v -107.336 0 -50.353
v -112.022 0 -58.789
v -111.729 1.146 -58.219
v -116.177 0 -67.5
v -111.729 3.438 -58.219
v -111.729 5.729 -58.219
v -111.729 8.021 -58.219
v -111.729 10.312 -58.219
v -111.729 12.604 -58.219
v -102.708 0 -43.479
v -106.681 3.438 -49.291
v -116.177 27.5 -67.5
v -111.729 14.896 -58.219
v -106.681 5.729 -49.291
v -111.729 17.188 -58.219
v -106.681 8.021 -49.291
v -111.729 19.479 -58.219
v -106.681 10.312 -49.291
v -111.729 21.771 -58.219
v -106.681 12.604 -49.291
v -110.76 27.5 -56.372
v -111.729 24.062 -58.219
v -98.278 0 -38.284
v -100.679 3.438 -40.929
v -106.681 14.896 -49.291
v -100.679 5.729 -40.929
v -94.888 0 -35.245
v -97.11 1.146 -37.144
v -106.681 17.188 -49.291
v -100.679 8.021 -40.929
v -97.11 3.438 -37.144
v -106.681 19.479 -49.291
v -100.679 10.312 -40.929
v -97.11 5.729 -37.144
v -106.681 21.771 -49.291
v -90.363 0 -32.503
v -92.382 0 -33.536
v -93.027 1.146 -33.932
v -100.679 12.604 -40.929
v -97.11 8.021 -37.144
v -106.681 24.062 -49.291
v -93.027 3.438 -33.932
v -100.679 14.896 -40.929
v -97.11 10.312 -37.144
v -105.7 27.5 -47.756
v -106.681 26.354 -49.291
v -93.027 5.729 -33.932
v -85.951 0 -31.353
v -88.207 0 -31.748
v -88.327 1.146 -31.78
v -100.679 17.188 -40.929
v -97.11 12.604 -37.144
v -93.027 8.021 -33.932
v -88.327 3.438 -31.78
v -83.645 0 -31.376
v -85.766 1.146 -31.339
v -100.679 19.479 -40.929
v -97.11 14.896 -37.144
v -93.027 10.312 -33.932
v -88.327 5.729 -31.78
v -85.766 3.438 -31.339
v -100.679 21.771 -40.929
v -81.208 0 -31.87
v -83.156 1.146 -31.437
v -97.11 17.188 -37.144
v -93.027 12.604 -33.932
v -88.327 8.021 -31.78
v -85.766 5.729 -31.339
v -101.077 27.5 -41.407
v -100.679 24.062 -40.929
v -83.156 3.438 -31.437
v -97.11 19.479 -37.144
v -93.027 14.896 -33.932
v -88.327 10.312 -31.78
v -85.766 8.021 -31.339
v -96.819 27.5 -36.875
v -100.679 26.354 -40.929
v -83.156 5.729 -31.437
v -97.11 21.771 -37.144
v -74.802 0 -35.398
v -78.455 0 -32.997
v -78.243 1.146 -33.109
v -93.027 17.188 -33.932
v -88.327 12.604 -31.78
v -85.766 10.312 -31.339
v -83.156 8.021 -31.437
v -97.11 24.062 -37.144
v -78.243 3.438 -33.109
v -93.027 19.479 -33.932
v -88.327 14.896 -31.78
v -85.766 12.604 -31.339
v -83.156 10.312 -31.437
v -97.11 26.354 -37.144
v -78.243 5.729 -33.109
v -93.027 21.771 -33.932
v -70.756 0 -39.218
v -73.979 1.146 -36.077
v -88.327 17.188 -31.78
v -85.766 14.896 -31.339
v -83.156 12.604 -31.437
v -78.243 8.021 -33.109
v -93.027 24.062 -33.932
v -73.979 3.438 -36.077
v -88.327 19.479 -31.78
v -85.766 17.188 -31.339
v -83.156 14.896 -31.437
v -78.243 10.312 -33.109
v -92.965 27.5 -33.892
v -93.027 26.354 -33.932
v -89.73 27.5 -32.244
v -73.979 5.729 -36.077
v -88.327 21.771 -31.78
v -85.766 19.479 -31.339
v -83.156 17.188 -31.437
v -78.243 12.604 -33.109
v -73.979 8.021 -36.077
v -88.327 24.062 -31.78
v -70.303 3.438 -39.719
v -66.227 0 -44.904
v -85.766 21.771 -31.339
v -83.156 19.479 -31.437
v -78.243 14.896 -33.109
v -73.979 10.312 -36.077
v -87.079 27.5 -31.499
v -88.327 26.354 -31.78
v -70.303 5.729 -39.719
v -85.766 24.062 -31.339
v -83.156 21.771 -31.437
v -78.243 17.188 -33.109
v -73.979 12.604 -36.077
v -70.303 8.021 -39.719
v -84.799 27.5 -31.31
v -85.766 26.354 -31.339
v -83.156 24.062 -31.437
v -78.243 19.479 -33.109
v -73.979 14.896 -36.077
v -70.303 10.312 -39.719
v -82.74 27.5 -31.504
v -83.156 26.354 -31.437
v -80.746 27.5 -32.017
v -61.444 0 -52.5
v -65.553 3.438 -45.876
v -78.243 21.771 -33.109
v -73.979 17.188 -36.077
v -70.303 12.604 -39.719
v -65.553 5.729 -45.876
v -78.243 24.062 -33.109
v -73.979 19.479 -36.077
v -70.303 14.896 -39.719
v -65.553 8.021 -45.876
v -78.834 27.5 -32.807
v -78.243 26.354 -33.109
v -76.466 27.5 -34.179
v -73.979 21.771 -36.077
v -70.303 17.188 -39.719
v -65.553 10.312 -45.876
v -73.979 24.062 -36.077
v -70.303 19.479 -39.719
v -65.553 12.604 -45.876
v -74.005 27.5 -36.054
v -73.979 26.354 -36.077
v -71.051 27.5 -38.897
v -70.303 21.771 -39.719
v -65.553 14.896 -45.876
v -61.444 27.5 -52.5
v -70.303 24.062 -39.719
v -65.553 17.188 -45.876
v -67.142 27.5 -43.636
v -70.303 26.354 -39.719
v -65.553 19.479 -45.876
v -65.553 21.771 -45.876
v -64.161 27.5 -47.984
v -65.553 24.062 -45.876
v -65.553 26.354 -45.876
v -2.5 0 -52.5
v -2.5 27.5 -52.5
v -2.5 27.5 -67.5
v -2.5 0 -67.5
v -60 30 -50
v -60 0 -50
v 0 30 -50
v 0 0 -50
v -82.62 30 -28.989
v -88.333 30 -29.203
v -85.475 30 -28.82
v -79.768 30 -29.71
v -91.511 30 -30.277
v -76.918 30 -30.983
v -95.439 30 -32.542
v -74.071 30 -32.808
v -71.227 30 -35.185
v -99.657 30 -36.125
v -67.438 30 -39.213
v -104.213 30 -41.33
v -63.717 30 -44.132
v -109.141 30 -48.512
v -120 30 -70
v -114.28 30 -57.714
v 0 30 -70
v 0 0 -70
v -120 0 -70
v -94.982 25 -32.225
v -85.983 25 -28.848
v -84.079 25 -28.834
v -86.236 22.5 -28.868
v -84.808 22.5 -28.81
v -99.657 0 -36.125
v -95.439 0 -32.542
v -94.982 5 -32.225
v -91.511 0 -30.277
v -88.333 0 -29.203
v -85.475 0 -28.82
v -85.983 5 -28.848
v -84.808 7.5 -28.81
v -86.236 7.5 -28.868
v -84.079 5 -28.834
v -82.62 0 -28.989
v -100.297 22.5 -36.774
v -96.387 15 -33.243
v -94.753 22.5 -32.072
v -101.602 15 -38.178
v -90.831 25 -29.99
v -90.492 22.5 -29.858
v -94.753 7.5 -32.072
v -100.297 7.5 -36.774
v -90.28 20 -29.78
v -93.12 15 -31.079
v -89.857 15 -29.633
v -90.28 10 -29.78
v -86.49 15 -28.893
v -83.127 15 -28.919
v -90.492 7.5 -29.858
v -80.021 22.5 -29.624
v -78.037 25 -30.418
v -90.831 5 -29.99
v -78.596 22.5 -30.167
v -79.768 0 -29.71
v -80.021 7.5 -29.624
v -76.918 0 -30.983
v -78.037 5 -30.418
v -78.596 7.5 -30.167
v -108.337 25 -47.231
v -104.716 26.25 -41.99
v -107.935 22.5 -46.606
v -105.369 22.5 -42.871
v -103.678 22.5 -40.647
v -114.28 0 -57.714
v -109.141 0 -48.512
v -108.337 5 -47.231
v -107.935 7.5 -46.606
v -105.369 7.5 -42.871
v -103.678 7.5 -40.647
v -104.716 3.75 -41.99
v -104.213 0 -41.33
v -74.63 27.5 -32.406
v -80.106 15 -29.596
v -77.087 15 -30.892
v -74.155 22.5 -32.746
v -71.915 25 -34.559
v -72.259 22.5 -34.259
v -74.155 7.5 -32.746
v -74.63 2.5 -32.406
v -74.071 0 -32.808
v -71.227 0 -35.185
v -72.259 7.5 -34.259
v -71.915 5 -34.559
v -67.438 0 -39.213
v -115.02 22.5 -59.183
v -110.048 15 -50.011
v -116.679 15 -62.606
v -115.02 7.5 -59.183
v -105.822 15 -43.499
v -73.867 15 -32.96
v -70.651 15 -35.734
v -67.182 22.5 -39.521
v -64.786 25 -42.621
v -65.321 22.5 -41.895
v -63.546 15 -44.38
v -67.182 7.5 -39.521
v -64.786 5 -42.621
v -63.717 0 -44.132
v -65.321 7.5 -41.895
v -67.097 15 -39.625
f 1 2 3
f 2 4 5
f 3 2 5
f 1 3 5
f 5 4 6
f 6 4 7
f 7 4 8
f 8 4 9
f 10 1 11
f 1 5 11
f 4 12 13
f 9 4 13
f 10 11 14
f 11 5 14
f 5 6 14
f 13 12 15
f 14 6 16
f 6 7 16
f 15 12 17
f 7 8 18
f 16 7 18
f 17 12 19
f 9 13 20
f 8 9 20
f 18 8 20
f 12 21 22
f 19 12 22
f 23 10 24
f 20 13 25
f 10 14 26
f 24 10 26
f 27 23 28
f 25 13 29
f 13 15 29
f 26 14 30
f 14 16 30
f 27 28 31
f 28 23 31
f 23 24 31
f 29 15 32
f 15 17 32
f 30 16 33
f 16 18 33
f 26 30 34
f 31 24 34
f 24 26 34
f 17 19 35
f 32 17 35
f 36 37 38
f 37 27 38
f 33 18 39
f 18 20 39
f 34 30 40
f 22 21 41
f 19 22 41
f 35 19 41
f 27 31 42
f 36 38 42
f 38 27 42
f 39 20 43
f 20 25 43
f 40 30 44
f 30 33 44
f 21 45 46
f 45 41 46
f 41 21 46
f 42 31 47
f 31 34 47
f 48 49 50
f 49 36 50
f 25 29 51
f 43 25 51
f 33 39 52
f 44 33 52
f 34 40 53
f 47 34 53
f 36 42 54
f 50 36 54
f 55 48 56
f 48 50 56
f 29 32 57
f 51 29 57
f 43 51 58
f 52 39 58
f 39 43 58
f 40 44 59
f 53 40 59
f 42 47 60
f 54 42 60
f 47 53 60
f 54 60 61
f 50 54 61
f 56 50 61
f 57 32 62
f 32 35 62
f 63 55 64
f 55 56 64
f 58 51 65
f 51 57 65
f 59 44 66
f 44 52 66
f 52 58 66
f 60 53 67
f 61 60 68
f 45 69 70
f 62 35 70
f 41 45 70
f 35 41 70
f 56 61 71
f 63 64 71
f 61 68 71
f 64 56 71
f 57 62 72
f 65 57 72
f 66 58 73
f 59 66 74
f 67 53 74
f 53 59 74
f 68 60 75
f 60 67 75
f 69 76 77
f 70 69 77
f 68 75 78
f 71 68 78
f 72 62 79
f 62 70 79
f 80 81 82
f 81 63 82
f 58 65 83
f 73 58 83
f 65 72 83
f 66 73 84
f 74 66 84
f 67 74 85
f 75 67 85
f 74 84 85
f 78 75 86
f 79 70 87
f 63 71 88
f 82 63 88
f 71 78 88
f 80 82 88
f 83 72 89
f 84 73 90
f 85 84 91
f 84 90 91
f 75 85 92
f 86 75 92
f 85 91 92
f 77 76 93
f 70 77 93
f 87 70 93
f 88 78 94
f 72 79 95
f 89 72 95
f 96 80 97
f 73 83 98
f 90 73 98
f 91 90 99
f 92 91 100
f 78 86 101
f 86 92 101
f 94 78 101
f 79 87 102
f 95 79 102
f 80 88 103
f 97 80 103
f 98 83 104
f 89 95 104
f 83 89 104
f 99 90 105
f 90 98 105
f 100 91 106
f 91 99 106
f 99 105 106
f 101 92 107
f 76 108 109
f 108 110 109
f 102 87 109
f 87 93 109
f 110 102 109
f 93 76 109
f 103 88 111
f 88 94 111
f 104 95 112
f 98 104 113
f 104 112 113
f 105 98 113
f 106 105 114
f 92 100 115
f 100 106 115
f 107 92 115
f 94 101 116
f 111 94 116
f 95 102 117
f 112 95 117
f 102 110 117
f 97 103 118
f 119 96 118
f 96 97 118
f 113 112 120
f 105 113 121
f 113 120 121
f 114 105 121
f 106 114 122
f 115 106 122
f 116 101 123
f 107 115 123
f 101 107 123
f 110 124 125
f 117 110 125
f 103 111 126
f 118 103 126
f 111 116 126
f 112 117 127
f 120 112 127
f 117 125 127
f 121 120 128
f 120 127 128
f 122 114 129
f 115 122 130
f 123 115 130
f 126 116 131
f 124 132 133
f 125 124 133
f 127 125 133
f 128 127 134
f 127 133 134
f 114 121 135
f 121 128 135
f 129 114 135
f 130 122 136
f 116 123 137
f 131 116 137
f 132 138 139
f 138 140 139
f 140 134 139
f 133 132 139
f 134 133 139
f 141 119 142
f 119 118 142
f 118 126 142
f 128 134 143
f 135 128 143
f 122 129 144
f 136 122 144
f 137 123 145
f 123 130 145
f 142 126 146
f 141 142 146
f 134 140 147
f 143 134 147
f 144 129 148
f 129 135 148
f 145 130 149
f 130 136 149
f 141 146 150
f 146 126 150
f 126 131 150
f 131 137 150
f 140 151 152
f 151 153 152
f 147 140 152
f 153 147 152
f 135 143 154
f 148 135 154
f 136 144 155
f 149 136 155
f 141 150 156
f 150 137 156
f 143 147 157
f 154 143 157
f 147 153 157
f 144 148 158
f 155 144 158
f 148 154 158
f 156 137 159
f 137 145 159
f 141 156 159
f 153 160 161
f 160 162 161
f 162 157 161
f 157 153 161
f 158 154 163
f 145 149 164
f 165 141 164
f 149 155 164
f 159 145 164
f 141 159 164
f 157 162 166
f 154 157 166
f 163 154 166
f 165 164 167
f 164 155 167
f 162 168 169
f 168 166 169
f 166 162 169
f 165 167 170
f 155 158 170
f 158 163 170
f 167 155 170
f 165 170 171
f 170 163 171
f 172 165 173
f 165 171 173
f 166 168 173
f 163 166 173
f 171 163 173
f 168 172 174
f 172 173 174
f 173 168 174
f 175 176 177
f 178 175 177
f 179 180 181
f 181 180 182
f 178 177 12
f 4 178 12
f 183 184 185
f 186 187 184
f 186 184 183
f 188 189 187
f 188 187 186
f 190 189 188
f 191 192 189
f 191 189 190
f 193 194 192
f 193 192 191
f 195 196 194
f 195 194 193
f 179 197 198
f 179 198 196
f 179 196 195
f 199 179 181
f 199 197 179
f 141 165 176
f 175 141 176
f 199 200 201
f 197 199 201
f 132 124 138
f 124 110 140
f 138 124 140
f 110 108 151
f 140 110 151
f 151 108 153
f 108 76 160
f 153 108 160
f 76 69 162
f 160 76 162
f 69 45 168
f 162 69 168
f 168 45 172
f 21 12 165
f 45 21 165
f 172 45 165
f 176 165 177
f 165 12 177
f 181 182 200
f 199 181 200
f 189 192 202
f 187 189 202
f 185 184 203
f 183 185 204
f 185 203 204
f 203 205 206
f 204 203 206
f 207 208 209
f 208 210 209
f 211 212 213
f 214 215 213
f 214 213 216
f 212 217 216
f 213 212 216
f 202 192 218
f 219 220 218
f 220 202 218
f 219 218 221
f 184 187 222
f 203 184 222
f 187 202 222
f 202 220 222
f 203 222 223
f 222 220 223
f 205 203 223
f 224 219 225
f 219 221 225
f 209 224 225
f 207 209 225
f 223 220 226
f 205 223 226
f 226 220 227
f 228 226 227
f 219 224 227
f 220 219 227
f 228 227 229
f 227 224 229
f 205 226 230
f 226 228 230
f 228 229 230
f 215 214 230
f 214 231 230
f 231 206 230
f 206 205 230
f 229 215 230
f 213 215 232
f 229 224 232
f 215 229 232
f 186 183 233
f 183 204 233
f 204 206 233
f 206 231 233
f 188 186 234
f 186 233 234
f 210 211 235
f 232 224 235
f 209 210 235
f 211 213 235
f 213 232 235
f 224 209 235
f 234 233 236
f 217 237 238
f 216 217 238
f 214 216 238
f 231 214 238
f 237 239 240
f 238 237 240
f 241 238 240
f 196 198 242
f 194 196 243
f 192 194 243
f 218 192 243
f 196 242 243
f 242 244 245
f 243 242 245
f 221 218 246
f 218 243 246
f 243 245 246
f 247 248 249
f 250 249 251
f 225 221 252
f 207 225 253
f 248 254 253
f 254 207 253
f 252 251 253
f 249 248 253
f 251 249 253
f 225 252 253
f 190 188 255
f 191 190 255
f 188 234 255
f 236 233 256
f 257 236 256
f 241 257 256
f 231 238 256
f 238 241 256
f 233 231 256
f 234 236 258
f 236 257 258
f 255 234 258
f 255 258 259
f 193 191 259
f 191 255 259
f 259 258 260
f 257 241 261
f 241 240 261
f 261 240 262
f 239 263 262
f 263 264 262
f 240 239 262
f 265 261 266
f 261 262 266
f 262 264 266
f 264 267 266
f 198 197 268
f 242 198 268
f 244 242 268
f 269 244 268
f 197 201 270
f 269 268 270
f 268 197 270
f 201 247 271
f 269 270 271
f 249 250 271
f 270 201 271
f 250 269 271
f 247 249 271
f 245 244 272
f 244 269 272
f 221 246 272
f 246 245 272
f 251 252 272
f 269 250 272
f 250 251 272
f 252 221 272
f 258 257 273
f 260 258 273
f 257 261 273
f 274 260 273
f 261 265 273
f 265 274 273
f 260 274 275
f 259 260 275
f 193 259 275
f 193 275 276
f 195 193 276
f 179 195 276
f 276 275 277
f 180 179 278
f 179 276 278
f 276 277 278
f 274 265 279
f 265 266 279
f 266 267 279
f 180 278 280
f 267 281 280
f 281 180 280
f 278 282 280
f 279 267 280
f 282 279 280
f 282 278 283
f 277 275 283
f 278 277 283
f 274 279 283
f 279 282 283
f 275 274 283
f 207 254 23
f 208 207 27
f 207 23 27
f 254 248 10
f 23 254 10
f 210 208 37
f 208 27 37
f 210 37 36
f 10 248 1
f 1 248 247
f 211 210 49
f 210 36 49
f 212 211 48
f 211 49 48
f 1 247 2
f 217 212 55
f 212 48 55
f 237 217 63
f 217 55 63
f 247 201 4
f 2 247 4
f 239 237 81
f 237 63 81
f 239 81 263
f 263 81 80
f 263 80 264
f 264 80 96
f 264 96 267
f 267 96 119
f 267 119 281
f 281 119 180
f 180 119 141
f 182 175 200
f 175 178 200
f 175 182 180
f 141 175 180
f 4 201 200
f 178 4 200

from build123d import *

# Parameters (mm, degrees)
SALIENTE_EXTRUIR5_DEPTH = 30
CORTAR_EXTRUIR3_START   = -2.5
CORTAR_EXTRUIR3_DEPTH   = 140.62670419


with BuildPart() as part:
    # Croquis2 → Saliente-Extruir5 (new body)
    with BuildSketch(Plane(origin=(0, 0, 0), x_dir=(1, 0, 0), z_dir=(0, 1, 0))):
        with BuildLine():
            Line((-60, 70), (-120, 70))
            add(Edge.make_bspline(
                [(-120, 70), (-89.713167171, -0.733691908), (-60, 50)],
                knots=[0, 0, 0, 1, 1, 1], degree=2))
            Line((-60, 50), (0, 50))
            Line((0, 50), (0, 70))
            Line((0, 70), (-60, 70))
        make_face()
    extrude(amount=SALIENTE_EXTRUIR5_DEPTH)

    # Croquis6 → Cortar-Extruir3 (cut, through all)
    with BuildSketch(Plane(origin=(0, 30, 0), x_dir=(1, 0, 0), z_dir=(0, 1, 0)).offset(CORTAR_EXTRUIR3_START)):
        with BuildLine():
            Line((-61.443608846, 52.5), (-2.5, 52.5))
            Line((-2.5, 52.5), (-2.5, 67.5))
            Line((-2.5, 67.5), (-116.177064023, 67.5))
            add(Edge.make_bspline(
                [(-116.177064023, 67.5), (-114.771949279, 64.36029718), (-113.298573184, 61.260952171), (-110.159197746, 55.176145812), (-108.494822806, 52.189724076), (-105.774709206, 47.842260502), (-104.830277833, 46.415411024), (-102.84047971, 43.621387577), (-101.795600134, 42.253925578), (-100.120108367, 40.266686798), (-99.542667673, 39.614451444), (-98.354918015, 38.34961794), (-97.743462298, 37.735507144), (-96.477317691, 36.552301744), (-95.822698231, 35.983134847), (-94.458482086, 34.90204564), (-93.754263765, 34.394646732), (-92.3006624, 33.469003582), (-91.550079072, 33.049597651), (-90.378524873, 32.503876968), (-89.980353401, 32.335941503), (-89.166392132, 32.03223314), (-88.748175399, 31.895869396), (-87.485221486, 31.548664142), (-86.631979489, 31.398555215), (-85.33330058, 31.309196309), (-84.896827736, 31.302062963), (-84.019122286, 31.335175348), (-83.585082186, 31.375092766), (-82.296447109, 31.560304367), (-81.455315589, 31.770952245), (-80.216992234, 32.200384688), (-79.808755024, 32.362438708), (-79.013463711, 32.714675587), (-78.624438583, 32.905503689), (-77.479889065, 33.51642508), (-76.746737647, 33.974694553), (-75.327341507, 34.97127288), (-74.638588887, 35.512159344), (-72.660147986, 37.205526196), (-71.447730367, 38.431624015), (-69.158190303, 41.007233467), (-68.082268078, 42.357839921), (-66.541849459, 44.45076279), (-66.040847863, 45.159753109), (-65.064206831, 46.591540977), (-64.587998187, 47.31511405), (-63.190803125, 49.505760993), (-62.3010242, 50.992620961), (-61.443608846, 52.5)],
                knots=[0, 0, 0, 0, 0.125, 0.125, 0.25, 0.25, 0.3125, 0.3125, 0.375, 0.375, 0.40625, 0.40625, 0.4375, 0.4375, 0.46875, 0.46875, 0.5, 0.5, 0.53125, 0.53125, 0.546875, 0.546875, 0.5625, 0.5625, 0.59375, 0.59375, 0.609375, 0.609375, 0.625, 0.625, 0.65625, 0.65625, 0.671875, 0.671875, 0.6875, 0.6875, 0.71875, 0.71875, 0.75, 0.75, 0.8125, 0.8125, 0.875, 0.875, 0.90625, 0.90625, 0.9375, 0.9375, 1, 1, 1, 1], degree=3))
        make_face()
    extrude(amount=-CORTAR_EXTRUIR3_DEPTH, mode=Mode.SUBTRACT)


solid = part.part
